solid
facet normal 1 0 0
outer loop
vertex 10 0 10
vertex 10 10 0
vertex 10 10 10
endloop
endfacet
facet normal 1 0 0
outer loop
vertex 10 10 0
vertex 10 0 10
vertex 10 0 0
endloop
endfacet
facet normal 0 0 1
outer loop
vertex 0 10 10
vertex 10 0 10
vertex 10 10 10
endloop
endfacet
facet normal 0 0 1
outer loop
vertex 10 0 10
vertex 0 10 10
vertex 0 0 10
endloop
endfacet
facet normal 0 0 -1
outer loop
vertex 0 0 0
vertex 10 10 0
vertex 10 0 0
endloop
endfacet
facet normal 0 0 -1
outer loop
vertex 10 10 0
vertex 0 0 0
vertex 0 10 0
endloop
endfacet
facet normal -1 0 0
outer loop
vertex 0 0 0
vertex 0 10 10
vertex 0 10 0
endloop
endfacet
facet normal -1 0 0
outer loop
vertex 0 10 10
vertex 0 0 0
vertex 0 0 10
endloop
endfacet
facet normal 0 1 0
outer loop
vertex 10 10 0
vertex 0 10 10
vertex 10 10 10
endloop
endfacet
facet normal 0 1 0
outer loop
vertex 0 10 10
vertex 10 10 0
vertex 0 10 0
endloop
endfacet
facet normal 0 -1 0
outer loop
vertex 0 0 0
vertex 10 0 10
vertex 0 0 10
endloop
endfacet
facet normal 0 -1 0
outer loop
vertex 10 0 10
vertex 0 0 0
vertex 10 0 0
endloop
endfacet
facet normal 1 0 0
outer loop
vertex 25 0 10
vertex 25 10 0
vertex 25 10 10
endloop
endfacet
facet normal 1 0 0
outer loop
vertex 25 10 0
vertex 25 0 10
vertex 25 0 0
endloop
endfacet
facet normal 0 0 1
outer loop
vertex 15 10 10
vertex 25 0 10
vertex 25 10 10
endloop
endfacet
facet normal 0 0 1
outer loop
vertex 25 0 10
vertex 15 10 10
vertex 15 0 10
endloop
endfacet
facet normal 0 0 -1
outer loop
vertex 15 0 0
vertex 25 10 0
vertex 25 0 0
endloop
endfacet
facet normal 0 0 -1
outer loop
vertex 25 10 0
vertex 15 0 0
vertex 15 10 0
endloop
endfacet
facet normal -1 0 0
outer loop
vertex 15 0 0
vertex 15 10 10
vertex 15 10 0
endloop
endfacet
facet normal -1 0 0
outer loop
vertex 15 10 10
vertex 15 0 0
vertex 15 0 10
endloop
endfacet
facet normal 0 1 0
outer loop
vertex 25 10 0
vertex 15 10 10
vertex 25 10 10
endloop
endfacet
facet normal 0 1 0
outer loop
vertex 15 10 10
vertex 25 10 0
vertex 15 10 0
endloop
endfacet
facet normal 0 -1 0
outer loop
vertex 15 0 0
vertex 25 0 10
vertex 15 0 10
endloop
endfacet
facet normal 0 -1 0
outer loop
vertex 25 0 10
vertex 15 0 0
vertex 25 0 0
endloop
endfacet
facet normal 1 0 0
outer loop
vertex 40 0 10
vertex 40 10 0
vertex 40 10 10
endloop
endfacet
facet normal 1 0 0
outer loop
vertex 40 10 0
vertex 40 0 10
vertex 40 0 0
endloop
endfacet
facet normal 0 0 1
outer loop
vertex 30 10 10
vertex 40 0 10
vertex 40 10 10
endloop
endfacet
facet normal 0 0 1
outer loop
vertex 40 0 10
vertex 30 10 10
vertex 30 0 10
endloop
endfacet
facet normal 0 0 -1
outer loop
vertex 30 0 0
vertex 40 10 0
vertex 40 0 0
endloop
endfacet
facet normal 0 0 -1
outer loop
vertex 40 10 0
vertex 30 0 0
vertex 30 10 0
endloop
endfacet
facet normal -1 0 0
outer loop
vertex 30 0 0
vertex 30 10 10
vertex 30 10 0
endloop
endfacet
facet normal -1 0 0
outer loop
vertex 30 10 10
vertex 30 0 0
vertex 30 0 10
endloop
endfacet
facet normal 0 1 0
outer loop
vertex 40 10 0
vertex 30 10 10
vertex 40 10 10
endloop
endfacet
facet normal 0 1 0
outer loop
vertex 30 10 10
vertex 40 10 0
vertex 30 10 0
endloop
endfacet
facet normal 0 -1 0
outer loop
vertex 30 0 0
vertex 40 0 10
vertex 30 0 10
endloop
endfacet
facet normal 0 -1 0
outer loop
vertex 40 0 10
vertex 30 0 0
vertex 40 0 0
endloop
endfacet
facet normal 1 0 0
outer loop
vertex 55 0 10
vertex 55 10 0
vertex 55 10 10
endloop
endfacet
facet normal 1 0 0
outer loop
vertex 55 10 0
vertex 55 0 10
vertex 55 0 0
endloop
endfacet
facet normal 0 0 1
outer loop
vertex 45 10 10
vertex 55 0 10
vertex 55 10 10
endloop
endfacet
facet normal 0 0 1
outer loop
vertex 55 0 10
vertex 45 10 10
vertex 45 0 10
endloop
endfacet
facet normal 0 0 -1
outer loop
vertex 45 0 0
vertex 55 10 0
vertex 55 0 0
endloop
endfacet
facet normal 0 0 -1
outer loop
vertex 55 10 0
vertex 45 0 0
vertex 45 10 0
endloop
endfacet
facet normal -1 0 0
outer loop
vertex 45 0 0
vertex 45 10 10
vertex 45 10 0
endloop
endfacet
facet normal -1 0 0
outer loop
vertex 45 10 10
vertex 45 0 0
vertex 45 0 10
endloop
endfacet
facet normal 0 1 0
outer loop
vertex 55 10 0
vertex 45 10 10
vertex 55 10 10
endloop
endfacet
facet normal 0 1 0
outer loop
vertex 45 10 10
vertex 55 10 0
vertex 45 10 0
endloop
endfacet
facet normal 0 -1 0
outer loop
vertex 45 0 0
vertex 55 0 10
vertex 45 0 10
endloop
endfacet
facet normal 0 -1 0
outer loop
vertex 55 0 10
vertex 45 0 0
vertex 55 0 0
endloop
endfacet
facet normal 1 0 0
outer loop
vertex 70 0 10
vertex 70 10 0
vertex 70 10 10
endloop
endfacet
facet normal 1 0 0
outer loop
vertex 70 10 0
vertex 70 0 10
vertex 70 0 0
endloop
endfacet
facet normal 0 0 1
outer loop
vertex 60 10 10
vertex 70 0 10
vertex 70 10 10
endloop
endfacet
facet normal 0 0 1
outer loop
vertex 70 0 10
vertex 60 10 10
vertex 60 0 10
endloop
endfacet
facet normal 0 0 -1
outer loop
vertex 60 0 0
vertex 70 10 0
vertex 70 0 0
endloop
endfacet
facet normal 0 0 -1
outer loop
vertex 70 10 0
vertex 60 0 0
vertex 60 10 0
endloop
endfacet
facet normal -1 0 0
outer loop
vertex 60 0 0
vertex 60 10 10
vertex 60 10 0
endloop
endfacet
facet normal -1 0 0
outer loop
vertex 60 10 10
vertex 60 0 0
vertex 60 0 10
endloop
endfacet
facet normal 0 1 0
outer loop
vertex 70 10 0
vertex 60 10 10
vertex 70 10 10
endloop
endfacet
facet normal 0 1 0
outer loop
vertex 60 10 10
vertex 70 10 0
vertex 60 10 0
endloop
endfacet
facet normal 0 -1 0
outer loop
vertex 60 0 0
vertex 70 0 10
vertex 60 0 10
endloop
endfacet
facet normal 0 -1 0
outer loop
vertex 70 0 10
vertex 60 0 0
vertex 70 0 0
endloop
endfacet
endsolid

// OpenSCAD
use <../nscad-lib.scad>

red()   cube(10);
green() move(15) cube(10);
blue()  move(30) cube(10);
white() move(45) cube(10);
black() move(60) cube(10);
